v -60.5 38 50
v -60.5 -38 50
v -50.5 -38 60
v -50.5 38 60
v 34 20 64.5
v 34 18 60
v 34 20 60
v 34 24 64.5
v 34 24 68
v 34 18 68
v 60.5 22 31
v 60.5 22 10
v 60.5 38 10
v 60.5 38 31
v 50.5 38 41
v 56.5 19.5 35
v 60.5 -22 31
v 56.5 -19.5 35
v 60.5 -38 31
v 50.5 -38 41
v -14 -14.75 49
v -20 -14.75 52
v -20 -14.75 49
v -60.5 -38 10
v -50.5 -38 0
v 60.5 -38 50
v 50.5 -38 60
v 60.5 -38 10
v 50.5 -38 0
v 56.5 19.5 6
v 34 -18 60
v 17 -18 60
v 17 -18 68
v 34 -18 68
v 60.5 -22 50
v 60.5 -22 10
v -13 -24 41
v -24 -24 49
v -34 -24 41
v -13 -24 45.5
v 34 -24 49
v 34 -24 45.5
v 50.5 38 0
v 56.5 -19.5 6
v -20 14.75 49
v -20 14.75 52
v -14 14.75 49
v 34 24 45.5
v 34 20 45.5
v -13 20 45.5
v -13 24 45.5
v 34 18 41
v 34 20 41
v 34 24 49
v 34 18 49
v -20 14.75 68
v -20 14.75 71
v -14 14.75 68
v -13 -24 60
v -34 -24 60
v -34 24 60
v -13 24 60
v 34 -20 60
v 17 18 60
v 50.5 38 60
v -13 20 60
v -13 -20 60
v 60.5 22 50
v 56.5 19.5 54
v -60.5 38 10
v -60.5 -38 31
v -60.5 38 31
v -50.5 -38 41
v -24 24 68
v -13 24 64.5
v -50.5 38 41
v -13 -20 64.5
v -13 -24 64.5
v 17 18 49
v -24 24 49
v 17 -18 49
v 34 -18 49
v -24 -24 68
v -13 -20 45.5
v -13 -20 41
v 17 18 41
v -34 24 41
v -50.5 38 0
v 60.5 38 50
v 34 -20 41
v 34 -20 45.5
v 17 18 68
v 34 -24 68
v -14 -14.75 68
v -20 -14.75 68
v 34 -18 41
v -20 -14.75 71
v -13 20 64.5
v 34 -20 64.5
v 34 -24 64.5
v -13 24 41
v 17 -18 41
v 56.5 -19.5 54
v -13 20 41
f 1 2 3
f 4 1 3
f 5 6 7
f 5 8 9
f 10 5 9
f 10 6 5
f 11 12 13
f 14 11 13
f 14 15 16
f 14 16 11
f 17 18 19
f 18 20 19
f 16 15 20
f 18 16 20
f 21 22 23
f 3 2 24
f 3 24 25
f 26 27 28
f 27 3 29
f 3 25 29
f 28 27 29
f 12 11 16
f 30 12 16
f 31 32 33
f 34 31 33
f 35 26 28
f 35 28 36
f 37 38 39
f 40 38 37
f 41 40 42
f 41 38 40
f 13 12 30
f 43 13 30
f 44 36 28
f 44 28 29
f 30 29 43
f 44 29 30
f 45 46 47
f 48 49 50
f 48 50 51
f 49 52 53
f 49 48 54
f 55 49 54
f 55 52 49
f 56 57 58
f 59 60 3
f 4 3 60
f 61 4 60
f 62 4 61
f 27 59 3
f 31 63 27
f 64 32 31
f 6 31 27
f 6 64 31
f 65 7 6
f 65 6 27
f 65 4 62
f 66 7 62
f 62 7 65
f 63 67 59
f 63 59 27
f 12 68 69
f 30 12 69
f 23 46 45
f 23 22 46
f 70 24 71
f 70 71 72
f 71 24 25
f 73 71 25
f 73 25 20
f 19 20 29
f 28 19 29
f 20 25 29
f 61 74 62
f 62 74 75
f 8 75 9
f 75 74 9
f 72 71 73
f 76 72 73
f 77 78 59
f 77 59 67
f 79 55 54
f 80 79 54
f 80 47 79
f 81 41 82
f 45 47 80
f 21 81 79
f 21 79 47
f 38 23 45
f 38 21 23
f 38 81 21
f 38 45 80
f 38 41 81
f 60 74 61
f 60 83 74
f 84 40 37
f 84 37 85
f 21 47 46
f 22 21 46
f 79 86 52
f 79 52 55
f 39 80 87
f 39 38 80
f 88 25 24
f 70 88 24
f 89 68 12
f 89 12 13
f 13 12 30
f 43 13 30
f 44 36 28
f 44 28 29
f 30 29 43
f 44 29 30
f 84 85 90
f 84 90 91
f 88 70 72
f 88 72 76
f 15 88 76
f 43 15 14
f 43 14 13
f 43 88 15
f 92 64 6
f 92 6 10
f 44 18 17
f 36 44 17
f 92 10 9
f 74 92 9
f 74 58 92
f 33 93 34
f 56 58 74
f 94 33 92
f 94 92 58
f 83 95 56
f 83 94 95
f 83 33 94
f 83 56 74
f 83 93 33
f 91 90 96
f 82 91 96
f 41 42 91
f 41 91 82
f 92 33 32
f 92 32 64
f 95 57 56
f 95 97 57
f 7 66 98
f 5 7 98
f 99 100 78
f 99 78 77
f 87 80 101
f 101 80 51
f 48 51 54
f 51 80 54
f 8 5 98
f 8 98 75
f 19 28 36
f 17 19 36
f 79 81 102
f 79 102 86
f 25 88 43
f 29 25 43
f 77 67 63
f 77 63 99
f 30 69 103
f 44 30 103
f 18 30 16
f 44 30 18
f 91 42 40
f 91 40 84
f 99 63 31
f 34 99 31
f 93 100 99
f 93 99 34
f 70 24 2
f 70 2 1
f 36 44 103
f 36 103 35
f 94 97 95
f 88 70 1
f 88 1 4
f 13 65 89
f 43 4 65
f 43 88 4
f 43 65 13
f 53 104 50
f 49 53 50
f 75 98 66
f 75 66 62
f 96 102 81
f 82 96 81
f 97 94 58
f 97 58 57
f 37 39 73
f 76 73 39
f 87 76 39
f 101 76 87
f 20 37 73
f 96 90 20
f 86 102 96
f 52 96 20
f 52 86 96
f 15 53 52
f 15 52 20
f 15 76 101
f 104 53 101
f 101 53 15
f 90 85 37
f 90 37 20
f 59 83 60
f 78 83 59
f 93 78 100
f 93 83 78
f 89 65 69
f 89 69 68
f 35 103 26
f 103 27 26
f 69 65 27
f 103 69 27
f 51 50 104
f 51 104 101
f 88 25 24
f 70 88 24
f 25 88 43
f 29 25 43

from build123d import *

# Parameters (mm, degrees)
SKETCH_W             = 121
SKETCH_H             = 76
PAD_DEPTH            = 60
POCKET_DEPTH         = 76.001
PAD001_DEPTH         = 24
SKETCH003_W          = 4
SKETCH003_H          = 4.5
POCKET001_DEPTH      = 47
SKETCH004_W          = 36
SKETCH004_H          = 8
POCKET002_DEPTH      = 17
PAD002_DEPTH         = 14.75
POCKET003_DEPTH      = 0.001
POCKET003_DEPTH_BACK = -71.001
SKETCH007_W          = 121
SKETCH007_H          = 76
PAD003_DEPTH         = 41
POCKET004_DEPTH      = 76.001
PAD004_DEPTH         = 24
SKETCH010_W          = 4
SKETCH010_H          = 4.5
POCKET005_DEPTH      = 47
SKETCH011_W          = 36
SKETCH011_H          = 8
POCKET006_DEPTH      = 17
PAD005_DEPTH         = 14.75
POCKET007_DEPTH      = 0.001
POCKET007_DEPTH_BACK = -52.001


with BuildPart() as f_4_0ah:
    # Sketch → Pad (new body)
    with BuildSketch(Plane.XY):
        Rectangle(SKETCH_W, SKETCH_H)
    extrude(amount=PAD_DEPTH)

    # Sketch001 (on Face3 of Pad) → Pocket (cut, through all)
    with BuildSketch(Plane.XZ.offset(38)):
        Polygon((-60.5, 10), (-60.5, 0), (-50.5, 0), align=None)
        Polygon((50.5, 0), (60.5, 0), (60.5, 10), align=None)
        Polygon((60.5, 60), (50.5, 60), (60.5, 50), align=None)
        Polygon((-60.5, 60), (-60.5, 50), (-50.5, 60), align=None)
    extrude(amount=-POCKET_DEPTH, mode=Mode.SUBTRACT)

    # Sketch002 → Pad001 (join, symmetric)
    with BuildSketch(Plane.XZ):
        Polygon((-24, 68), (-34, 60), (34, 60), (34, 68), align=None)
    extrude(amount=PAD001_DEPTH, both=True)

    # Sketch003 (on Face13 of Pad001) → Pocket001 (cut)
    with BuildSketch(Plane.YZ.offset(34)):
        with Locations((-22, 62.25)):
            Rectangle(SKETCH003_W, SKETCH003_H)
        with Locations((22, 62.25)):
            Rectangle(SKETCH003_W, SKETCH003_H)
    extrude(amount=-POCKET001_DEPTH, mode=Mode.SUBTRACT)

    # Sketch004 (on Face15 of Pocket001) → Pocket002 (cut)
    with BuildSketch(Plane.YZ.offset(34)):
        with Locations((0, 64)):
            Rectangle(SKETCH004_W, SKETCH004_H)
    extrude(amount=-POCKET002_DEPTH, mode=Mode.SUBTRACT)

    # Sketch005 → Pad002 (join, symmetric)
    with BuildSketch(Plane.XZ):
        Polygon((-20, 68), (-14, 68), (-20, 71), align=None)
    extrude(amount=PAD002_DEPTH, both=True)

    # Sketch006 → Pocket003 (cut, two sides)
    with BuildSketch(Plane.XY) as pocket003_sk:
        Polygon((60.5, 22), (56.5, 19.5), (56.5, -19.5), (60.5, -22), align=None)
    extrude(amount=-POCKET003_DEPTH, mode=Mode.SUBTRACT)
    extrude(pocket003_sk.sketch, amount=-POCKET003_DEPTH_BACK, mode=Mode.SUBTRACT)


with BuildPart() as f_2_0ah:
    # Sketch007 → Pad003 (new body)
    with BuildSketch(Plane.XY):
        Rectangle(SKETCH007_W, SKETCH007_H)
    extrude(amount=PAD003_DEPTH)

    # Sketch008 (on Face3 of Pad003) → Pocket004 (cut, through all)
    with BuildSketch(Plane.XZ.offset(38)):
        Polygon((-60.5, 10), (-60.5, 0), (-50.5, 0), align=None)
        Polygon((50.5, 0), (60.5, 0), (60.5, 10), align=None)
        Polygon((60.5, 41), (50.5, 41), (60.5, 31), align=None)
        Polygon((-60.5, 41), (-60.5, 31), (-50.5, 41), align=None)
    extrude(amount=-POCKET004_DEPTH, mode=Mode.SUBTRACT)

    # Sketch009 → Pad004 (join, symmetric)
    with BuildSketch(Plane.XZ):
        Polygon((-24, 49), (-34, 41), (34, 41), (34, 49), align=None)
    extrude(amount=PAD004_DEPTH, both=True)

    # Sketch010 (on Face13 of Pad004) → Pocket005 (cut)
    with BuildSketch(Plane.YZ.offset(34)):
        with Locations((-22, 43.25)):
            Rectangle(SKETCH010_W, SKETCH010_H)
        with Locations((22, 43.25)):
            Rectangle(SKETCH010_W, SKETCH010_H)
    extrude(amount=-POCKET005_DEPTH, mode=Mode.SUBTRACT)

    # Sketch011 (on Face15 of Pocket005) → Pocket006 (cut)
    with BuildSketch(Plane.YZ.offset(34)):
        with Locations((0, 45)):
            Rectangle(SKETCH011_W, SKETCH011_H)
    extrude(amount=-POCKET006_DEPTH, mode=Mode.SUBTRACT)

    # Sketch012 → Pad005 (join, symmetric)
    with BuildSketch(Plane.XZ):
        Polygon((-20, 49), (-14, 49), (-20, 52), align=None)
    extrude(amount=PAD005_DEPTH, both=True)

    # Sketch013 → Pocket007 (cut, two sides)
    with BuildSketch(Plane.XY) as pocket007_sk:
        Polygon((60.5, 22), (56.5, 19.5), (56.5, -19.5), (60.5, -22), align=None)
    extrude(amount=-POCKET007_DEPTH, mode=Mode.SUBTRACT)
    extrude(pocket007_sk.sketch, amount=-POCKET007_DEPTH_BACK, mode=Mode.SUBTRACT)


solid = Compound([f_4_0ah.part, f_2_0ah.part])
